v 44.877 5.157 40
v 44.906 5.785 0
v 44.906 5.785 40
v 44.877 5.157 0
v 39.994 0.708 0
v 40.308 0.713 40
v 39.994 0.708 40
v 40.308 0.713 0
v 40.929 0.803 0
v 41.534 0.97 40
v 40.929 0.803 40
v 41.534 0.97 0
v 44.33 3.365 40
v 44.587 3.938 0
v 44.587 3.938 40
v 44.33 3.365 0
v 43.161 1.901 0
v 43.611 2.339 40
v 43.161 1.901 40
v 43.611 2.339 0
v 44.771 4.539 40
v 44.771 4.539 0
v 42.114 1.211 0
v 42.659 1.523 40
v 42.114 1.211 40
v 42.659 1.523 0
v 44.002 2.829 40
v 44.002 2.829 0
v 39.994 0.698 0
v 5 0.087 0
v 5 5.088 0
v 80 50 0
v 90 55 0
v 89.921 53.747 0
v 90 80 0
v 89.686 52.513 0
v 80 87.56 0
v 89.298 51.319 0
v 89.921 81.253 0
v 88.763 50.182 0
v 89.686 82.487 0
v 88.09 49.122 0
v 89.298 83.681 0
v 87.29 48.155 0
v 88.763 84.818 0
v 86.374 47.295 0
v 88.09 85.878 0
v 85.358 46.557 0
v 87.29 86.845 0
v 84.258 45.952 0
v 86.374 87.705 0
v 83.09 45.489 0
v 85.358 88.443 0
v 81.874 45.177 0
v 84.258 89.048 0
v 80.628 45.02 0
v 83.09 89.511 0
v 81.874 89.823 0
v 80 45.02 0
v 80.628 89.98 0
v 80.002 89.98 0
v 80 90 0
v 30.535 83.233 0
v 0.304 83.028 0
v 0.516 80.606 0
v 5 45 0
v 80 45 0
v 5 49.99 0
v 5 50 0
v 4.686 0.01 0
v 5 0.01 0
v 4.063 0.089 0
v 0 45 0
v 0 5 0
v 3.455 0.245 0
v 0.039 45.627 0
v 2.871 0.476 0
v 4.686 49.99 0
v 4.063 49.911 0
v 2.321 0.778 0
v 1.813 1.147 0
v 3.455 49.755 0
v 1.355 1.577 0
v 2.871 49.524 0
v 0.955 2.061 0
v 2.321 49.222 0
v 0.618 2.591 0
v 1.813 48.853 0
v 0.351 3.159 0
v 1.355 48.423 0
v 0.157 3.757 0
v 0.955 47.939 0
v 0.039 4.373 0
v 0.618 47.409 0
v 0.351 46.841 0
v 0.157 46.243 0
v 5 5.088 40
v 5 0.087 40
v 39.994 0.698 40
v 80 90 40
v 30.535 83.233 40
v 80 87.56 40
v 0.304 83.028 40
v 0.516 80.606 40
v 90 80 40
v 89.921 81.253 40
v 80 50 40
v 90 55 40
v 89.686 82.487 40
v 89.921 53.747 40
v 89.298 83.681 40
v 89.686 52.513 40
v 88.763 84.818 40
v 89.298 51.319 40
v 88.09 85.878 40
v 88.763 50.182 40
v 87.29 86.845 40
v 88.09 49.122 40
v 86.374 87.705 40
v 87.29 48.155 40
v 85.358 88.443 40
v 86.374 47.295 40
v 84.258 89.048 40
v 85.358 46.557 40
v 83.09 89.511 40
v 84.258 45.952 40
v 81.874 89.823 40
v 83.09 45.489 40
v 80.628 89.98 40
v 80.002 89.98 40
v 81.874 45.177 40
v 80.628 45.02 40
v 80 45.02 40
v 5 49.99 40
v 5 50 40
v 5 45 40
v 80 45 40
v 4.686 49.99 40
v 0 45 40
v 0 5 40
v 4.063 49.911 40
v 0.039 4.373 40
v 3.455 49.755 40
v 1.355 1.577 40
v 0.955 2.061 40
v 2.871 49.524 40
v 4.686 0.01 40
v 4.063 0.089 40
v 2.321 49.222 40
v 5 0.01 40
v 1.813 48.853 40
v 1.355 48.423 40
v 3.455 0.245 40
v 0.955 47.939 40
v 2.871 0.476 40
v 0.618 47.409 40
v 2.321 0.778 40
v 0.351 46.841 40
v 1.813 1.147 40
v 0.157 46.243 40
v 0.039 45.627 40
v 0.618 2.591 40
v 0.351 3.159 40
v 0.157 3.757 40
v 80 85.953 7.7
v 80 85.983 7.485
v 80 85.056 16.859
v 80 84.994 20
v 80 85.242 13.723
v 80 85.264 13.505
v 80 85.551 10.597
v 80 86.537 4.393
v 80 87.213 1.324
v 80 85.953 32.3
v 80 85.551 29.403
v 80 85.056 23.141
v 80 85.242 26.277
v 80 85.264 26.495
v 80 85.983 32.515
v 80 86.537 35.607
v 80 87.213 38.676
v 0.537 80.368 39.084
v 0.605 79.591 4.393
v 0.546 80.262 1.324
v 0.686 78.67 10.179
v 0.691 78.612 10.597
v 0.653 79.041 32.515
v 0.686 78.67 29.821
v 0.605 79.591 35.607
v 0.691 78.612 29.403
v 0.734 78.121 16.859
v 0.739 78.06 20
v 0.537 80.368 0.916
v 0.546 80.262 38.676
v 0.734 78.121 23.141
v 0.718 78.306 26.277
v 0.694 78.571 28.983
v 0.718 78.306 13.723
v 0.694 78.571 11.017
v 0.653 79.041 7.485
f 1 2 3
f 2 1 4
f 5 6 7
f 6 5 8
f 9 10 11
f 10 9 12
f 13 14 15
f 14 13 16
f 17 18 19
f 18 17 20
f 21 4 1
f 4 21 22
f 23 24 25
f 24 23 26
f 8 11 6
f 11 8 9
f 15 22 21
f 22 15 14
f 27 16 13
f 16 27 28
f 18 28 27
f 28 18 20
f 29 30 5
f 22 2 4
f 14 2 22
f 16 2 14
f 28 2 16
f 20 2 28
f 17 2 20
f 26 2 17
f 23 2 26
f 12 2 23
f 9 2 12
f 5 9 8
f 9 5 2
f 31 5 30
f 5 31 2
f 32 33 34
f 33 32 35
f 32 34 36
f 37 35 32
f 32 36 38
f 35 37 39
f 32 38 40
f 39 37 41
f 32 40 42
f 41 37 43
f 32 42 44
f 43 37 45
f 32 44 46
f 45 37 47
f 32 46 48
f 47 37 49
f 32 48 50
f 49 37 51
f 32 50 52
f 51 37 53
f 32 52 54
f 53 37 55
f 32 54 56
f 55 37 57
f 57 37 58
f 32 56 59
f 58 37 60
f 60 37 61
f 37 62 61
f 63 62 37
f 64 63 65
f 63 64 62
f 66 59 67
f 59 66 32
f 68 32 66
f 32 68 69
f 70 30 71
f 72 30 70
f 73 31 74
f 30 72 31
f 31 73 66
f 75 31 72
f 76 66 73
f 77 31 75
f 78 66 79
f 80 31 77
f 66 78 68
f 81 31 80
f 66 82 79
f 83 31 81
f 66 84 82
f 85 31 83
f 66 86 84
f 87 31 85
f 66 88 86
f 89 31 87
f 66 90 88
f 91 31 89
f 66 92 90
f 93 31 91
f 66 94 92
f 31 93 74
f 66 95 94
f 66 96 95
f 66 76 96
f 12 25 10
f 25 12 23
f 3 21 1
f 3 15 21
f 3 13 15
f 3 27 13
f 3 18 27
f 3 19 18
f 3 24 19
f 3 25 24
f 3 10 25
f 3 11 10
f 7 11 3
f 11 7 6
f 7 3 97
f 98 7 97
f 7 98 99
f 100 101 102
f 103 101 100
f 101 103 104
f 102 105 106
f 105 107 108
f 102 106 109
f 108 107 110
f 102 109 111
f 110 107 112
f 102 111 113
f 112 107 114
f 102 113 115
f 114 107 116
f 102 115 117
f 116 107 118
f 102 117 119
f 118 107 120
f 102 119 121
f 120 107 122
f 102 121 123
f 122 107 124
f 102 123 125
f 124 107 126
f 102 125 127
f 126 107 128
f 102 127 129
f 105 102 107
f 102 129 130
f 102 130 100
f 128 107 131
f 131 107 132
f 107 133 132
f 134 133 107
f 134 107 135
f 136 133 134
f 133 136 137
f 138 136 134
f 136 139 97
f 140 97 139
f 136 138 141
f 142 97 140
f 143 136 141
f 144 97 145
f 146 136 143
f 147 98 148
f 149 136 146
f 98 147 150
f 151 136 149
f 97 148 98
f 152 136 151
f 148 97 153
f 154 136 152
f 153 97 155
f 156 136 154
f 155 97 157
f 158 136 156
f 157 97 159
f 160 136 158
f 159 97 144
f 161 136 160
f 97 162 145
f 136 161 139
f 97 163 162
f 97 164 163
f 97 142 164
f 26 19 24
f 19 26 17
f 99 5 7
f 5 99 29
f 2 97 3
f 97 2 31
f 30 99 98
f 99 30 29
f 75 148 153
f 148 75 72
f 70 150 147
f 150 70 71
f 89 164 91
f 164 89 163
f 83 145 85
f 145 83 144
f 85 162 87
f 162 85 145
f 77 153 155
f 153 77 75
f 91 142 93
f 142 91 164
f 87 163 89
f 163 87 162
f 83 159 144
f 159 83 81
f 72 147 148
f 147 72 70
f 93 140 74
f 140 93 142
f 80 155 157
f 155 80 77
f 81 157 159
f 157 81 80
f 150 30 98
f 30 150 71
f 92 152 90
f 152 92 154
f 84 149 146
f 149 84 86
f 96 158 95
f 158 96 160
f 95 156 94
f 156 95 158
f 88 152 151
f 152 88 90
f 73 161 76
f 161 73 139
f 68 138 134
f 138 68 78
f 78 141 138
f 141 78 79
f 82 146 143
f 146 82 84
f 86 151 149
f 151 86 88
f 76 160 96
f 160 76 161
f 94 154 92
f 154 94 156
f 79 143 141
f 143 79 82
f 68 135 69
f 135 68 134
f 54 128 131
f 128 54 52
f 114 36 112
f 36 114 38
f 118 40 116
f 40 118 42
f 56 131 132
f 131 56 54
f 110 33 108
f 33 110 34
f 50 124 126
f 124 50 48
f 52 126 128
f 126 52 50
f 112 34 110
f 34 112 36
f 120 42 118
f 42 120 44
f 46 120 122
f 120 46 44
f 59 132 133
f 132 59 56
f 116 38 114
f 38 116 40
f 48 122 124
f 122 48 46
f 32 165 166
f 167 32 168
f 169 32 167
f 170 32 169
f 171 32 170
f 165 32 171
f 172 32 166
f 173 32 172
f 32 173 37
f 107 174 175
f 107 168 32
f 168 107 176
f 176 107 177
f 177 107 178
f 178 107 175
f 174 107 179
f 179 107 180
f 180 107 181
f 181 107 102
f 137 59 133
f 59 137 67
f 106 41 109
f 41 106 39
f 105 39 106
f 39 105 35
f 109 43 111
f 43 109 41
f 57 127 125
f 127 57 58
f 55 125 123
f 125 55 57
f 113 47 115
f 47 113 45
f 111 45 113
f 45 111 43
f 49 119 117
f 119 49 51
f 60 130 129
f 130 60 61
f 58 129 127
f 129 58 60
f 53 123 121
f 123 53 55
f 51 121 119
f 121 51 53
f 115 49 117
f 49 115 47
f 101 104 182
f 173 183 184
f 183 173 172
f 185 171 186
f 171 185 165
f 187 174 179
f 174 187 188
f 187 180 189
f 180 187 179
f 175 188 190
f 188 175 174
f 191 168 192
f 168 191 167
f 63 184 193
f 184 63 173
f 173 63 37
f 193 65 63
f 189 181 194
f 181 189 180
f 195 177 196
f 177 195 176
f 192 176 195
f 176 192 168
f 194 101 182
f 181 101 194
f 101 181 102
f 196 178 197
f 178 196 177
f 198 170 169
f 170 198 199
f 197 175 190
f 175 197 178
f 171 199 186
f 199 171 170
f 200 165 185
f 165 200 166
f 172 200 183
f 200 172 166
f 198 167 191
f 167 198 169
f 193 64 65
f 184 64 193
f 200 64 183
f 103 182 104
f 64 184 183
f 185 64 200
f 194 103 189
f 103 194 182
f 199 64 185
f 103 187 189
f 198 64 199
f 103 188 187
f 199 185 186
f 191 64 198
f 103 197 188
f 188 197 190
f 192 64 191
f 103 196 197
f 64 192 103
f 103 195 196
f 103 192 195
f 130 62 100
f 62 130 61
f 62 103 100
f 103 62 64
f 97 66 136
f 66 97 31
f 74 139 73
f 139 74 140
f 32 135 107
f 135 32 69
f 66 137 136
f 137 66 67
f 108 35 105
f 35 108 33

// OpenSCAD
//How thick is your Desk (in mm)?
thickness_of_desk = 40;
//How wide should the Headphoneholder be (in mm)?
width = 40;//[10:80]
//How thick is the Headband of your Headset?
thickness_of_headset = 30;


rha = width*2; //Radius Headset Auflage

//Tischklemme+Rundung
rotate([0,0,1]){
    translate([5,0,0]){
    cube([35,5,width]);
        translate([35,5,0]){
            intersection(){
                cylinder(width,5,5,$fn=50);
                translate([0,-5,0]){
                    cube([5,5,width]);
                }
            }
        }
    }
}

//Rundung Ecke Tischklemme/thickness_of_desknabstand
translate([5,5,0]){
    intersection(){
        cylinder(width,5,5,$fn=50);
        translate([-5,-5,0]){
            cube([5,5,width]);
        }
    }
}

//thickness_of_desknabstand
translate([0,5,0]){
    cube([5,thickness_of_desk,width]);
}

//Rundung Ecke thickness_of_desknabstand/langes Ding
translate([5,thickness_of_desk+5,0]){
    intersection(){
        cylinder(width,5,5,$fn=50);
        translate([-5,0,0]){
            cube([5,5,width]);
        }
    }
}

//Langes Ding
translate([5,5+thickness_of_desk,0]){
    cube([75,5,width]);
}

//Rundung langes Ding/Headsetabstand
translate([80,15+thickness_of_desk,0]){
    intersection(){
        cylinder(width,10,10,$fn=50);
        translate([0,-10,0]){
            cube([10,10,width]);
        }
    }
}

//Headset abstand
translate([80,15+thickness_of_desk,0]){
    cube([10,thickness_of_headset-5,width]);
}

//Rundung Headsetabstand/auflage
translate([80,thickness_of_headset+10+thickness_of_desk,0]){
    intersection(){
        cylinder(width,10,10,$fn=50);
        translate([0,0,0]){
            cube([10,10,width]);
        }
    }
}

//Headset Auflage 4,5DEG
translate([80,thickness_of_headset+20+thickness_of_desk,0]){
    intersection(){
        translate([0,rha-4.7,width/2]){
            rotate([0,-90,5]){
                cylinder(100,rha,rha,$fn=rha*2);
            }
        }
        rotate([0,0,185]){
            cube([80,5,width]);
        }
    }
}
